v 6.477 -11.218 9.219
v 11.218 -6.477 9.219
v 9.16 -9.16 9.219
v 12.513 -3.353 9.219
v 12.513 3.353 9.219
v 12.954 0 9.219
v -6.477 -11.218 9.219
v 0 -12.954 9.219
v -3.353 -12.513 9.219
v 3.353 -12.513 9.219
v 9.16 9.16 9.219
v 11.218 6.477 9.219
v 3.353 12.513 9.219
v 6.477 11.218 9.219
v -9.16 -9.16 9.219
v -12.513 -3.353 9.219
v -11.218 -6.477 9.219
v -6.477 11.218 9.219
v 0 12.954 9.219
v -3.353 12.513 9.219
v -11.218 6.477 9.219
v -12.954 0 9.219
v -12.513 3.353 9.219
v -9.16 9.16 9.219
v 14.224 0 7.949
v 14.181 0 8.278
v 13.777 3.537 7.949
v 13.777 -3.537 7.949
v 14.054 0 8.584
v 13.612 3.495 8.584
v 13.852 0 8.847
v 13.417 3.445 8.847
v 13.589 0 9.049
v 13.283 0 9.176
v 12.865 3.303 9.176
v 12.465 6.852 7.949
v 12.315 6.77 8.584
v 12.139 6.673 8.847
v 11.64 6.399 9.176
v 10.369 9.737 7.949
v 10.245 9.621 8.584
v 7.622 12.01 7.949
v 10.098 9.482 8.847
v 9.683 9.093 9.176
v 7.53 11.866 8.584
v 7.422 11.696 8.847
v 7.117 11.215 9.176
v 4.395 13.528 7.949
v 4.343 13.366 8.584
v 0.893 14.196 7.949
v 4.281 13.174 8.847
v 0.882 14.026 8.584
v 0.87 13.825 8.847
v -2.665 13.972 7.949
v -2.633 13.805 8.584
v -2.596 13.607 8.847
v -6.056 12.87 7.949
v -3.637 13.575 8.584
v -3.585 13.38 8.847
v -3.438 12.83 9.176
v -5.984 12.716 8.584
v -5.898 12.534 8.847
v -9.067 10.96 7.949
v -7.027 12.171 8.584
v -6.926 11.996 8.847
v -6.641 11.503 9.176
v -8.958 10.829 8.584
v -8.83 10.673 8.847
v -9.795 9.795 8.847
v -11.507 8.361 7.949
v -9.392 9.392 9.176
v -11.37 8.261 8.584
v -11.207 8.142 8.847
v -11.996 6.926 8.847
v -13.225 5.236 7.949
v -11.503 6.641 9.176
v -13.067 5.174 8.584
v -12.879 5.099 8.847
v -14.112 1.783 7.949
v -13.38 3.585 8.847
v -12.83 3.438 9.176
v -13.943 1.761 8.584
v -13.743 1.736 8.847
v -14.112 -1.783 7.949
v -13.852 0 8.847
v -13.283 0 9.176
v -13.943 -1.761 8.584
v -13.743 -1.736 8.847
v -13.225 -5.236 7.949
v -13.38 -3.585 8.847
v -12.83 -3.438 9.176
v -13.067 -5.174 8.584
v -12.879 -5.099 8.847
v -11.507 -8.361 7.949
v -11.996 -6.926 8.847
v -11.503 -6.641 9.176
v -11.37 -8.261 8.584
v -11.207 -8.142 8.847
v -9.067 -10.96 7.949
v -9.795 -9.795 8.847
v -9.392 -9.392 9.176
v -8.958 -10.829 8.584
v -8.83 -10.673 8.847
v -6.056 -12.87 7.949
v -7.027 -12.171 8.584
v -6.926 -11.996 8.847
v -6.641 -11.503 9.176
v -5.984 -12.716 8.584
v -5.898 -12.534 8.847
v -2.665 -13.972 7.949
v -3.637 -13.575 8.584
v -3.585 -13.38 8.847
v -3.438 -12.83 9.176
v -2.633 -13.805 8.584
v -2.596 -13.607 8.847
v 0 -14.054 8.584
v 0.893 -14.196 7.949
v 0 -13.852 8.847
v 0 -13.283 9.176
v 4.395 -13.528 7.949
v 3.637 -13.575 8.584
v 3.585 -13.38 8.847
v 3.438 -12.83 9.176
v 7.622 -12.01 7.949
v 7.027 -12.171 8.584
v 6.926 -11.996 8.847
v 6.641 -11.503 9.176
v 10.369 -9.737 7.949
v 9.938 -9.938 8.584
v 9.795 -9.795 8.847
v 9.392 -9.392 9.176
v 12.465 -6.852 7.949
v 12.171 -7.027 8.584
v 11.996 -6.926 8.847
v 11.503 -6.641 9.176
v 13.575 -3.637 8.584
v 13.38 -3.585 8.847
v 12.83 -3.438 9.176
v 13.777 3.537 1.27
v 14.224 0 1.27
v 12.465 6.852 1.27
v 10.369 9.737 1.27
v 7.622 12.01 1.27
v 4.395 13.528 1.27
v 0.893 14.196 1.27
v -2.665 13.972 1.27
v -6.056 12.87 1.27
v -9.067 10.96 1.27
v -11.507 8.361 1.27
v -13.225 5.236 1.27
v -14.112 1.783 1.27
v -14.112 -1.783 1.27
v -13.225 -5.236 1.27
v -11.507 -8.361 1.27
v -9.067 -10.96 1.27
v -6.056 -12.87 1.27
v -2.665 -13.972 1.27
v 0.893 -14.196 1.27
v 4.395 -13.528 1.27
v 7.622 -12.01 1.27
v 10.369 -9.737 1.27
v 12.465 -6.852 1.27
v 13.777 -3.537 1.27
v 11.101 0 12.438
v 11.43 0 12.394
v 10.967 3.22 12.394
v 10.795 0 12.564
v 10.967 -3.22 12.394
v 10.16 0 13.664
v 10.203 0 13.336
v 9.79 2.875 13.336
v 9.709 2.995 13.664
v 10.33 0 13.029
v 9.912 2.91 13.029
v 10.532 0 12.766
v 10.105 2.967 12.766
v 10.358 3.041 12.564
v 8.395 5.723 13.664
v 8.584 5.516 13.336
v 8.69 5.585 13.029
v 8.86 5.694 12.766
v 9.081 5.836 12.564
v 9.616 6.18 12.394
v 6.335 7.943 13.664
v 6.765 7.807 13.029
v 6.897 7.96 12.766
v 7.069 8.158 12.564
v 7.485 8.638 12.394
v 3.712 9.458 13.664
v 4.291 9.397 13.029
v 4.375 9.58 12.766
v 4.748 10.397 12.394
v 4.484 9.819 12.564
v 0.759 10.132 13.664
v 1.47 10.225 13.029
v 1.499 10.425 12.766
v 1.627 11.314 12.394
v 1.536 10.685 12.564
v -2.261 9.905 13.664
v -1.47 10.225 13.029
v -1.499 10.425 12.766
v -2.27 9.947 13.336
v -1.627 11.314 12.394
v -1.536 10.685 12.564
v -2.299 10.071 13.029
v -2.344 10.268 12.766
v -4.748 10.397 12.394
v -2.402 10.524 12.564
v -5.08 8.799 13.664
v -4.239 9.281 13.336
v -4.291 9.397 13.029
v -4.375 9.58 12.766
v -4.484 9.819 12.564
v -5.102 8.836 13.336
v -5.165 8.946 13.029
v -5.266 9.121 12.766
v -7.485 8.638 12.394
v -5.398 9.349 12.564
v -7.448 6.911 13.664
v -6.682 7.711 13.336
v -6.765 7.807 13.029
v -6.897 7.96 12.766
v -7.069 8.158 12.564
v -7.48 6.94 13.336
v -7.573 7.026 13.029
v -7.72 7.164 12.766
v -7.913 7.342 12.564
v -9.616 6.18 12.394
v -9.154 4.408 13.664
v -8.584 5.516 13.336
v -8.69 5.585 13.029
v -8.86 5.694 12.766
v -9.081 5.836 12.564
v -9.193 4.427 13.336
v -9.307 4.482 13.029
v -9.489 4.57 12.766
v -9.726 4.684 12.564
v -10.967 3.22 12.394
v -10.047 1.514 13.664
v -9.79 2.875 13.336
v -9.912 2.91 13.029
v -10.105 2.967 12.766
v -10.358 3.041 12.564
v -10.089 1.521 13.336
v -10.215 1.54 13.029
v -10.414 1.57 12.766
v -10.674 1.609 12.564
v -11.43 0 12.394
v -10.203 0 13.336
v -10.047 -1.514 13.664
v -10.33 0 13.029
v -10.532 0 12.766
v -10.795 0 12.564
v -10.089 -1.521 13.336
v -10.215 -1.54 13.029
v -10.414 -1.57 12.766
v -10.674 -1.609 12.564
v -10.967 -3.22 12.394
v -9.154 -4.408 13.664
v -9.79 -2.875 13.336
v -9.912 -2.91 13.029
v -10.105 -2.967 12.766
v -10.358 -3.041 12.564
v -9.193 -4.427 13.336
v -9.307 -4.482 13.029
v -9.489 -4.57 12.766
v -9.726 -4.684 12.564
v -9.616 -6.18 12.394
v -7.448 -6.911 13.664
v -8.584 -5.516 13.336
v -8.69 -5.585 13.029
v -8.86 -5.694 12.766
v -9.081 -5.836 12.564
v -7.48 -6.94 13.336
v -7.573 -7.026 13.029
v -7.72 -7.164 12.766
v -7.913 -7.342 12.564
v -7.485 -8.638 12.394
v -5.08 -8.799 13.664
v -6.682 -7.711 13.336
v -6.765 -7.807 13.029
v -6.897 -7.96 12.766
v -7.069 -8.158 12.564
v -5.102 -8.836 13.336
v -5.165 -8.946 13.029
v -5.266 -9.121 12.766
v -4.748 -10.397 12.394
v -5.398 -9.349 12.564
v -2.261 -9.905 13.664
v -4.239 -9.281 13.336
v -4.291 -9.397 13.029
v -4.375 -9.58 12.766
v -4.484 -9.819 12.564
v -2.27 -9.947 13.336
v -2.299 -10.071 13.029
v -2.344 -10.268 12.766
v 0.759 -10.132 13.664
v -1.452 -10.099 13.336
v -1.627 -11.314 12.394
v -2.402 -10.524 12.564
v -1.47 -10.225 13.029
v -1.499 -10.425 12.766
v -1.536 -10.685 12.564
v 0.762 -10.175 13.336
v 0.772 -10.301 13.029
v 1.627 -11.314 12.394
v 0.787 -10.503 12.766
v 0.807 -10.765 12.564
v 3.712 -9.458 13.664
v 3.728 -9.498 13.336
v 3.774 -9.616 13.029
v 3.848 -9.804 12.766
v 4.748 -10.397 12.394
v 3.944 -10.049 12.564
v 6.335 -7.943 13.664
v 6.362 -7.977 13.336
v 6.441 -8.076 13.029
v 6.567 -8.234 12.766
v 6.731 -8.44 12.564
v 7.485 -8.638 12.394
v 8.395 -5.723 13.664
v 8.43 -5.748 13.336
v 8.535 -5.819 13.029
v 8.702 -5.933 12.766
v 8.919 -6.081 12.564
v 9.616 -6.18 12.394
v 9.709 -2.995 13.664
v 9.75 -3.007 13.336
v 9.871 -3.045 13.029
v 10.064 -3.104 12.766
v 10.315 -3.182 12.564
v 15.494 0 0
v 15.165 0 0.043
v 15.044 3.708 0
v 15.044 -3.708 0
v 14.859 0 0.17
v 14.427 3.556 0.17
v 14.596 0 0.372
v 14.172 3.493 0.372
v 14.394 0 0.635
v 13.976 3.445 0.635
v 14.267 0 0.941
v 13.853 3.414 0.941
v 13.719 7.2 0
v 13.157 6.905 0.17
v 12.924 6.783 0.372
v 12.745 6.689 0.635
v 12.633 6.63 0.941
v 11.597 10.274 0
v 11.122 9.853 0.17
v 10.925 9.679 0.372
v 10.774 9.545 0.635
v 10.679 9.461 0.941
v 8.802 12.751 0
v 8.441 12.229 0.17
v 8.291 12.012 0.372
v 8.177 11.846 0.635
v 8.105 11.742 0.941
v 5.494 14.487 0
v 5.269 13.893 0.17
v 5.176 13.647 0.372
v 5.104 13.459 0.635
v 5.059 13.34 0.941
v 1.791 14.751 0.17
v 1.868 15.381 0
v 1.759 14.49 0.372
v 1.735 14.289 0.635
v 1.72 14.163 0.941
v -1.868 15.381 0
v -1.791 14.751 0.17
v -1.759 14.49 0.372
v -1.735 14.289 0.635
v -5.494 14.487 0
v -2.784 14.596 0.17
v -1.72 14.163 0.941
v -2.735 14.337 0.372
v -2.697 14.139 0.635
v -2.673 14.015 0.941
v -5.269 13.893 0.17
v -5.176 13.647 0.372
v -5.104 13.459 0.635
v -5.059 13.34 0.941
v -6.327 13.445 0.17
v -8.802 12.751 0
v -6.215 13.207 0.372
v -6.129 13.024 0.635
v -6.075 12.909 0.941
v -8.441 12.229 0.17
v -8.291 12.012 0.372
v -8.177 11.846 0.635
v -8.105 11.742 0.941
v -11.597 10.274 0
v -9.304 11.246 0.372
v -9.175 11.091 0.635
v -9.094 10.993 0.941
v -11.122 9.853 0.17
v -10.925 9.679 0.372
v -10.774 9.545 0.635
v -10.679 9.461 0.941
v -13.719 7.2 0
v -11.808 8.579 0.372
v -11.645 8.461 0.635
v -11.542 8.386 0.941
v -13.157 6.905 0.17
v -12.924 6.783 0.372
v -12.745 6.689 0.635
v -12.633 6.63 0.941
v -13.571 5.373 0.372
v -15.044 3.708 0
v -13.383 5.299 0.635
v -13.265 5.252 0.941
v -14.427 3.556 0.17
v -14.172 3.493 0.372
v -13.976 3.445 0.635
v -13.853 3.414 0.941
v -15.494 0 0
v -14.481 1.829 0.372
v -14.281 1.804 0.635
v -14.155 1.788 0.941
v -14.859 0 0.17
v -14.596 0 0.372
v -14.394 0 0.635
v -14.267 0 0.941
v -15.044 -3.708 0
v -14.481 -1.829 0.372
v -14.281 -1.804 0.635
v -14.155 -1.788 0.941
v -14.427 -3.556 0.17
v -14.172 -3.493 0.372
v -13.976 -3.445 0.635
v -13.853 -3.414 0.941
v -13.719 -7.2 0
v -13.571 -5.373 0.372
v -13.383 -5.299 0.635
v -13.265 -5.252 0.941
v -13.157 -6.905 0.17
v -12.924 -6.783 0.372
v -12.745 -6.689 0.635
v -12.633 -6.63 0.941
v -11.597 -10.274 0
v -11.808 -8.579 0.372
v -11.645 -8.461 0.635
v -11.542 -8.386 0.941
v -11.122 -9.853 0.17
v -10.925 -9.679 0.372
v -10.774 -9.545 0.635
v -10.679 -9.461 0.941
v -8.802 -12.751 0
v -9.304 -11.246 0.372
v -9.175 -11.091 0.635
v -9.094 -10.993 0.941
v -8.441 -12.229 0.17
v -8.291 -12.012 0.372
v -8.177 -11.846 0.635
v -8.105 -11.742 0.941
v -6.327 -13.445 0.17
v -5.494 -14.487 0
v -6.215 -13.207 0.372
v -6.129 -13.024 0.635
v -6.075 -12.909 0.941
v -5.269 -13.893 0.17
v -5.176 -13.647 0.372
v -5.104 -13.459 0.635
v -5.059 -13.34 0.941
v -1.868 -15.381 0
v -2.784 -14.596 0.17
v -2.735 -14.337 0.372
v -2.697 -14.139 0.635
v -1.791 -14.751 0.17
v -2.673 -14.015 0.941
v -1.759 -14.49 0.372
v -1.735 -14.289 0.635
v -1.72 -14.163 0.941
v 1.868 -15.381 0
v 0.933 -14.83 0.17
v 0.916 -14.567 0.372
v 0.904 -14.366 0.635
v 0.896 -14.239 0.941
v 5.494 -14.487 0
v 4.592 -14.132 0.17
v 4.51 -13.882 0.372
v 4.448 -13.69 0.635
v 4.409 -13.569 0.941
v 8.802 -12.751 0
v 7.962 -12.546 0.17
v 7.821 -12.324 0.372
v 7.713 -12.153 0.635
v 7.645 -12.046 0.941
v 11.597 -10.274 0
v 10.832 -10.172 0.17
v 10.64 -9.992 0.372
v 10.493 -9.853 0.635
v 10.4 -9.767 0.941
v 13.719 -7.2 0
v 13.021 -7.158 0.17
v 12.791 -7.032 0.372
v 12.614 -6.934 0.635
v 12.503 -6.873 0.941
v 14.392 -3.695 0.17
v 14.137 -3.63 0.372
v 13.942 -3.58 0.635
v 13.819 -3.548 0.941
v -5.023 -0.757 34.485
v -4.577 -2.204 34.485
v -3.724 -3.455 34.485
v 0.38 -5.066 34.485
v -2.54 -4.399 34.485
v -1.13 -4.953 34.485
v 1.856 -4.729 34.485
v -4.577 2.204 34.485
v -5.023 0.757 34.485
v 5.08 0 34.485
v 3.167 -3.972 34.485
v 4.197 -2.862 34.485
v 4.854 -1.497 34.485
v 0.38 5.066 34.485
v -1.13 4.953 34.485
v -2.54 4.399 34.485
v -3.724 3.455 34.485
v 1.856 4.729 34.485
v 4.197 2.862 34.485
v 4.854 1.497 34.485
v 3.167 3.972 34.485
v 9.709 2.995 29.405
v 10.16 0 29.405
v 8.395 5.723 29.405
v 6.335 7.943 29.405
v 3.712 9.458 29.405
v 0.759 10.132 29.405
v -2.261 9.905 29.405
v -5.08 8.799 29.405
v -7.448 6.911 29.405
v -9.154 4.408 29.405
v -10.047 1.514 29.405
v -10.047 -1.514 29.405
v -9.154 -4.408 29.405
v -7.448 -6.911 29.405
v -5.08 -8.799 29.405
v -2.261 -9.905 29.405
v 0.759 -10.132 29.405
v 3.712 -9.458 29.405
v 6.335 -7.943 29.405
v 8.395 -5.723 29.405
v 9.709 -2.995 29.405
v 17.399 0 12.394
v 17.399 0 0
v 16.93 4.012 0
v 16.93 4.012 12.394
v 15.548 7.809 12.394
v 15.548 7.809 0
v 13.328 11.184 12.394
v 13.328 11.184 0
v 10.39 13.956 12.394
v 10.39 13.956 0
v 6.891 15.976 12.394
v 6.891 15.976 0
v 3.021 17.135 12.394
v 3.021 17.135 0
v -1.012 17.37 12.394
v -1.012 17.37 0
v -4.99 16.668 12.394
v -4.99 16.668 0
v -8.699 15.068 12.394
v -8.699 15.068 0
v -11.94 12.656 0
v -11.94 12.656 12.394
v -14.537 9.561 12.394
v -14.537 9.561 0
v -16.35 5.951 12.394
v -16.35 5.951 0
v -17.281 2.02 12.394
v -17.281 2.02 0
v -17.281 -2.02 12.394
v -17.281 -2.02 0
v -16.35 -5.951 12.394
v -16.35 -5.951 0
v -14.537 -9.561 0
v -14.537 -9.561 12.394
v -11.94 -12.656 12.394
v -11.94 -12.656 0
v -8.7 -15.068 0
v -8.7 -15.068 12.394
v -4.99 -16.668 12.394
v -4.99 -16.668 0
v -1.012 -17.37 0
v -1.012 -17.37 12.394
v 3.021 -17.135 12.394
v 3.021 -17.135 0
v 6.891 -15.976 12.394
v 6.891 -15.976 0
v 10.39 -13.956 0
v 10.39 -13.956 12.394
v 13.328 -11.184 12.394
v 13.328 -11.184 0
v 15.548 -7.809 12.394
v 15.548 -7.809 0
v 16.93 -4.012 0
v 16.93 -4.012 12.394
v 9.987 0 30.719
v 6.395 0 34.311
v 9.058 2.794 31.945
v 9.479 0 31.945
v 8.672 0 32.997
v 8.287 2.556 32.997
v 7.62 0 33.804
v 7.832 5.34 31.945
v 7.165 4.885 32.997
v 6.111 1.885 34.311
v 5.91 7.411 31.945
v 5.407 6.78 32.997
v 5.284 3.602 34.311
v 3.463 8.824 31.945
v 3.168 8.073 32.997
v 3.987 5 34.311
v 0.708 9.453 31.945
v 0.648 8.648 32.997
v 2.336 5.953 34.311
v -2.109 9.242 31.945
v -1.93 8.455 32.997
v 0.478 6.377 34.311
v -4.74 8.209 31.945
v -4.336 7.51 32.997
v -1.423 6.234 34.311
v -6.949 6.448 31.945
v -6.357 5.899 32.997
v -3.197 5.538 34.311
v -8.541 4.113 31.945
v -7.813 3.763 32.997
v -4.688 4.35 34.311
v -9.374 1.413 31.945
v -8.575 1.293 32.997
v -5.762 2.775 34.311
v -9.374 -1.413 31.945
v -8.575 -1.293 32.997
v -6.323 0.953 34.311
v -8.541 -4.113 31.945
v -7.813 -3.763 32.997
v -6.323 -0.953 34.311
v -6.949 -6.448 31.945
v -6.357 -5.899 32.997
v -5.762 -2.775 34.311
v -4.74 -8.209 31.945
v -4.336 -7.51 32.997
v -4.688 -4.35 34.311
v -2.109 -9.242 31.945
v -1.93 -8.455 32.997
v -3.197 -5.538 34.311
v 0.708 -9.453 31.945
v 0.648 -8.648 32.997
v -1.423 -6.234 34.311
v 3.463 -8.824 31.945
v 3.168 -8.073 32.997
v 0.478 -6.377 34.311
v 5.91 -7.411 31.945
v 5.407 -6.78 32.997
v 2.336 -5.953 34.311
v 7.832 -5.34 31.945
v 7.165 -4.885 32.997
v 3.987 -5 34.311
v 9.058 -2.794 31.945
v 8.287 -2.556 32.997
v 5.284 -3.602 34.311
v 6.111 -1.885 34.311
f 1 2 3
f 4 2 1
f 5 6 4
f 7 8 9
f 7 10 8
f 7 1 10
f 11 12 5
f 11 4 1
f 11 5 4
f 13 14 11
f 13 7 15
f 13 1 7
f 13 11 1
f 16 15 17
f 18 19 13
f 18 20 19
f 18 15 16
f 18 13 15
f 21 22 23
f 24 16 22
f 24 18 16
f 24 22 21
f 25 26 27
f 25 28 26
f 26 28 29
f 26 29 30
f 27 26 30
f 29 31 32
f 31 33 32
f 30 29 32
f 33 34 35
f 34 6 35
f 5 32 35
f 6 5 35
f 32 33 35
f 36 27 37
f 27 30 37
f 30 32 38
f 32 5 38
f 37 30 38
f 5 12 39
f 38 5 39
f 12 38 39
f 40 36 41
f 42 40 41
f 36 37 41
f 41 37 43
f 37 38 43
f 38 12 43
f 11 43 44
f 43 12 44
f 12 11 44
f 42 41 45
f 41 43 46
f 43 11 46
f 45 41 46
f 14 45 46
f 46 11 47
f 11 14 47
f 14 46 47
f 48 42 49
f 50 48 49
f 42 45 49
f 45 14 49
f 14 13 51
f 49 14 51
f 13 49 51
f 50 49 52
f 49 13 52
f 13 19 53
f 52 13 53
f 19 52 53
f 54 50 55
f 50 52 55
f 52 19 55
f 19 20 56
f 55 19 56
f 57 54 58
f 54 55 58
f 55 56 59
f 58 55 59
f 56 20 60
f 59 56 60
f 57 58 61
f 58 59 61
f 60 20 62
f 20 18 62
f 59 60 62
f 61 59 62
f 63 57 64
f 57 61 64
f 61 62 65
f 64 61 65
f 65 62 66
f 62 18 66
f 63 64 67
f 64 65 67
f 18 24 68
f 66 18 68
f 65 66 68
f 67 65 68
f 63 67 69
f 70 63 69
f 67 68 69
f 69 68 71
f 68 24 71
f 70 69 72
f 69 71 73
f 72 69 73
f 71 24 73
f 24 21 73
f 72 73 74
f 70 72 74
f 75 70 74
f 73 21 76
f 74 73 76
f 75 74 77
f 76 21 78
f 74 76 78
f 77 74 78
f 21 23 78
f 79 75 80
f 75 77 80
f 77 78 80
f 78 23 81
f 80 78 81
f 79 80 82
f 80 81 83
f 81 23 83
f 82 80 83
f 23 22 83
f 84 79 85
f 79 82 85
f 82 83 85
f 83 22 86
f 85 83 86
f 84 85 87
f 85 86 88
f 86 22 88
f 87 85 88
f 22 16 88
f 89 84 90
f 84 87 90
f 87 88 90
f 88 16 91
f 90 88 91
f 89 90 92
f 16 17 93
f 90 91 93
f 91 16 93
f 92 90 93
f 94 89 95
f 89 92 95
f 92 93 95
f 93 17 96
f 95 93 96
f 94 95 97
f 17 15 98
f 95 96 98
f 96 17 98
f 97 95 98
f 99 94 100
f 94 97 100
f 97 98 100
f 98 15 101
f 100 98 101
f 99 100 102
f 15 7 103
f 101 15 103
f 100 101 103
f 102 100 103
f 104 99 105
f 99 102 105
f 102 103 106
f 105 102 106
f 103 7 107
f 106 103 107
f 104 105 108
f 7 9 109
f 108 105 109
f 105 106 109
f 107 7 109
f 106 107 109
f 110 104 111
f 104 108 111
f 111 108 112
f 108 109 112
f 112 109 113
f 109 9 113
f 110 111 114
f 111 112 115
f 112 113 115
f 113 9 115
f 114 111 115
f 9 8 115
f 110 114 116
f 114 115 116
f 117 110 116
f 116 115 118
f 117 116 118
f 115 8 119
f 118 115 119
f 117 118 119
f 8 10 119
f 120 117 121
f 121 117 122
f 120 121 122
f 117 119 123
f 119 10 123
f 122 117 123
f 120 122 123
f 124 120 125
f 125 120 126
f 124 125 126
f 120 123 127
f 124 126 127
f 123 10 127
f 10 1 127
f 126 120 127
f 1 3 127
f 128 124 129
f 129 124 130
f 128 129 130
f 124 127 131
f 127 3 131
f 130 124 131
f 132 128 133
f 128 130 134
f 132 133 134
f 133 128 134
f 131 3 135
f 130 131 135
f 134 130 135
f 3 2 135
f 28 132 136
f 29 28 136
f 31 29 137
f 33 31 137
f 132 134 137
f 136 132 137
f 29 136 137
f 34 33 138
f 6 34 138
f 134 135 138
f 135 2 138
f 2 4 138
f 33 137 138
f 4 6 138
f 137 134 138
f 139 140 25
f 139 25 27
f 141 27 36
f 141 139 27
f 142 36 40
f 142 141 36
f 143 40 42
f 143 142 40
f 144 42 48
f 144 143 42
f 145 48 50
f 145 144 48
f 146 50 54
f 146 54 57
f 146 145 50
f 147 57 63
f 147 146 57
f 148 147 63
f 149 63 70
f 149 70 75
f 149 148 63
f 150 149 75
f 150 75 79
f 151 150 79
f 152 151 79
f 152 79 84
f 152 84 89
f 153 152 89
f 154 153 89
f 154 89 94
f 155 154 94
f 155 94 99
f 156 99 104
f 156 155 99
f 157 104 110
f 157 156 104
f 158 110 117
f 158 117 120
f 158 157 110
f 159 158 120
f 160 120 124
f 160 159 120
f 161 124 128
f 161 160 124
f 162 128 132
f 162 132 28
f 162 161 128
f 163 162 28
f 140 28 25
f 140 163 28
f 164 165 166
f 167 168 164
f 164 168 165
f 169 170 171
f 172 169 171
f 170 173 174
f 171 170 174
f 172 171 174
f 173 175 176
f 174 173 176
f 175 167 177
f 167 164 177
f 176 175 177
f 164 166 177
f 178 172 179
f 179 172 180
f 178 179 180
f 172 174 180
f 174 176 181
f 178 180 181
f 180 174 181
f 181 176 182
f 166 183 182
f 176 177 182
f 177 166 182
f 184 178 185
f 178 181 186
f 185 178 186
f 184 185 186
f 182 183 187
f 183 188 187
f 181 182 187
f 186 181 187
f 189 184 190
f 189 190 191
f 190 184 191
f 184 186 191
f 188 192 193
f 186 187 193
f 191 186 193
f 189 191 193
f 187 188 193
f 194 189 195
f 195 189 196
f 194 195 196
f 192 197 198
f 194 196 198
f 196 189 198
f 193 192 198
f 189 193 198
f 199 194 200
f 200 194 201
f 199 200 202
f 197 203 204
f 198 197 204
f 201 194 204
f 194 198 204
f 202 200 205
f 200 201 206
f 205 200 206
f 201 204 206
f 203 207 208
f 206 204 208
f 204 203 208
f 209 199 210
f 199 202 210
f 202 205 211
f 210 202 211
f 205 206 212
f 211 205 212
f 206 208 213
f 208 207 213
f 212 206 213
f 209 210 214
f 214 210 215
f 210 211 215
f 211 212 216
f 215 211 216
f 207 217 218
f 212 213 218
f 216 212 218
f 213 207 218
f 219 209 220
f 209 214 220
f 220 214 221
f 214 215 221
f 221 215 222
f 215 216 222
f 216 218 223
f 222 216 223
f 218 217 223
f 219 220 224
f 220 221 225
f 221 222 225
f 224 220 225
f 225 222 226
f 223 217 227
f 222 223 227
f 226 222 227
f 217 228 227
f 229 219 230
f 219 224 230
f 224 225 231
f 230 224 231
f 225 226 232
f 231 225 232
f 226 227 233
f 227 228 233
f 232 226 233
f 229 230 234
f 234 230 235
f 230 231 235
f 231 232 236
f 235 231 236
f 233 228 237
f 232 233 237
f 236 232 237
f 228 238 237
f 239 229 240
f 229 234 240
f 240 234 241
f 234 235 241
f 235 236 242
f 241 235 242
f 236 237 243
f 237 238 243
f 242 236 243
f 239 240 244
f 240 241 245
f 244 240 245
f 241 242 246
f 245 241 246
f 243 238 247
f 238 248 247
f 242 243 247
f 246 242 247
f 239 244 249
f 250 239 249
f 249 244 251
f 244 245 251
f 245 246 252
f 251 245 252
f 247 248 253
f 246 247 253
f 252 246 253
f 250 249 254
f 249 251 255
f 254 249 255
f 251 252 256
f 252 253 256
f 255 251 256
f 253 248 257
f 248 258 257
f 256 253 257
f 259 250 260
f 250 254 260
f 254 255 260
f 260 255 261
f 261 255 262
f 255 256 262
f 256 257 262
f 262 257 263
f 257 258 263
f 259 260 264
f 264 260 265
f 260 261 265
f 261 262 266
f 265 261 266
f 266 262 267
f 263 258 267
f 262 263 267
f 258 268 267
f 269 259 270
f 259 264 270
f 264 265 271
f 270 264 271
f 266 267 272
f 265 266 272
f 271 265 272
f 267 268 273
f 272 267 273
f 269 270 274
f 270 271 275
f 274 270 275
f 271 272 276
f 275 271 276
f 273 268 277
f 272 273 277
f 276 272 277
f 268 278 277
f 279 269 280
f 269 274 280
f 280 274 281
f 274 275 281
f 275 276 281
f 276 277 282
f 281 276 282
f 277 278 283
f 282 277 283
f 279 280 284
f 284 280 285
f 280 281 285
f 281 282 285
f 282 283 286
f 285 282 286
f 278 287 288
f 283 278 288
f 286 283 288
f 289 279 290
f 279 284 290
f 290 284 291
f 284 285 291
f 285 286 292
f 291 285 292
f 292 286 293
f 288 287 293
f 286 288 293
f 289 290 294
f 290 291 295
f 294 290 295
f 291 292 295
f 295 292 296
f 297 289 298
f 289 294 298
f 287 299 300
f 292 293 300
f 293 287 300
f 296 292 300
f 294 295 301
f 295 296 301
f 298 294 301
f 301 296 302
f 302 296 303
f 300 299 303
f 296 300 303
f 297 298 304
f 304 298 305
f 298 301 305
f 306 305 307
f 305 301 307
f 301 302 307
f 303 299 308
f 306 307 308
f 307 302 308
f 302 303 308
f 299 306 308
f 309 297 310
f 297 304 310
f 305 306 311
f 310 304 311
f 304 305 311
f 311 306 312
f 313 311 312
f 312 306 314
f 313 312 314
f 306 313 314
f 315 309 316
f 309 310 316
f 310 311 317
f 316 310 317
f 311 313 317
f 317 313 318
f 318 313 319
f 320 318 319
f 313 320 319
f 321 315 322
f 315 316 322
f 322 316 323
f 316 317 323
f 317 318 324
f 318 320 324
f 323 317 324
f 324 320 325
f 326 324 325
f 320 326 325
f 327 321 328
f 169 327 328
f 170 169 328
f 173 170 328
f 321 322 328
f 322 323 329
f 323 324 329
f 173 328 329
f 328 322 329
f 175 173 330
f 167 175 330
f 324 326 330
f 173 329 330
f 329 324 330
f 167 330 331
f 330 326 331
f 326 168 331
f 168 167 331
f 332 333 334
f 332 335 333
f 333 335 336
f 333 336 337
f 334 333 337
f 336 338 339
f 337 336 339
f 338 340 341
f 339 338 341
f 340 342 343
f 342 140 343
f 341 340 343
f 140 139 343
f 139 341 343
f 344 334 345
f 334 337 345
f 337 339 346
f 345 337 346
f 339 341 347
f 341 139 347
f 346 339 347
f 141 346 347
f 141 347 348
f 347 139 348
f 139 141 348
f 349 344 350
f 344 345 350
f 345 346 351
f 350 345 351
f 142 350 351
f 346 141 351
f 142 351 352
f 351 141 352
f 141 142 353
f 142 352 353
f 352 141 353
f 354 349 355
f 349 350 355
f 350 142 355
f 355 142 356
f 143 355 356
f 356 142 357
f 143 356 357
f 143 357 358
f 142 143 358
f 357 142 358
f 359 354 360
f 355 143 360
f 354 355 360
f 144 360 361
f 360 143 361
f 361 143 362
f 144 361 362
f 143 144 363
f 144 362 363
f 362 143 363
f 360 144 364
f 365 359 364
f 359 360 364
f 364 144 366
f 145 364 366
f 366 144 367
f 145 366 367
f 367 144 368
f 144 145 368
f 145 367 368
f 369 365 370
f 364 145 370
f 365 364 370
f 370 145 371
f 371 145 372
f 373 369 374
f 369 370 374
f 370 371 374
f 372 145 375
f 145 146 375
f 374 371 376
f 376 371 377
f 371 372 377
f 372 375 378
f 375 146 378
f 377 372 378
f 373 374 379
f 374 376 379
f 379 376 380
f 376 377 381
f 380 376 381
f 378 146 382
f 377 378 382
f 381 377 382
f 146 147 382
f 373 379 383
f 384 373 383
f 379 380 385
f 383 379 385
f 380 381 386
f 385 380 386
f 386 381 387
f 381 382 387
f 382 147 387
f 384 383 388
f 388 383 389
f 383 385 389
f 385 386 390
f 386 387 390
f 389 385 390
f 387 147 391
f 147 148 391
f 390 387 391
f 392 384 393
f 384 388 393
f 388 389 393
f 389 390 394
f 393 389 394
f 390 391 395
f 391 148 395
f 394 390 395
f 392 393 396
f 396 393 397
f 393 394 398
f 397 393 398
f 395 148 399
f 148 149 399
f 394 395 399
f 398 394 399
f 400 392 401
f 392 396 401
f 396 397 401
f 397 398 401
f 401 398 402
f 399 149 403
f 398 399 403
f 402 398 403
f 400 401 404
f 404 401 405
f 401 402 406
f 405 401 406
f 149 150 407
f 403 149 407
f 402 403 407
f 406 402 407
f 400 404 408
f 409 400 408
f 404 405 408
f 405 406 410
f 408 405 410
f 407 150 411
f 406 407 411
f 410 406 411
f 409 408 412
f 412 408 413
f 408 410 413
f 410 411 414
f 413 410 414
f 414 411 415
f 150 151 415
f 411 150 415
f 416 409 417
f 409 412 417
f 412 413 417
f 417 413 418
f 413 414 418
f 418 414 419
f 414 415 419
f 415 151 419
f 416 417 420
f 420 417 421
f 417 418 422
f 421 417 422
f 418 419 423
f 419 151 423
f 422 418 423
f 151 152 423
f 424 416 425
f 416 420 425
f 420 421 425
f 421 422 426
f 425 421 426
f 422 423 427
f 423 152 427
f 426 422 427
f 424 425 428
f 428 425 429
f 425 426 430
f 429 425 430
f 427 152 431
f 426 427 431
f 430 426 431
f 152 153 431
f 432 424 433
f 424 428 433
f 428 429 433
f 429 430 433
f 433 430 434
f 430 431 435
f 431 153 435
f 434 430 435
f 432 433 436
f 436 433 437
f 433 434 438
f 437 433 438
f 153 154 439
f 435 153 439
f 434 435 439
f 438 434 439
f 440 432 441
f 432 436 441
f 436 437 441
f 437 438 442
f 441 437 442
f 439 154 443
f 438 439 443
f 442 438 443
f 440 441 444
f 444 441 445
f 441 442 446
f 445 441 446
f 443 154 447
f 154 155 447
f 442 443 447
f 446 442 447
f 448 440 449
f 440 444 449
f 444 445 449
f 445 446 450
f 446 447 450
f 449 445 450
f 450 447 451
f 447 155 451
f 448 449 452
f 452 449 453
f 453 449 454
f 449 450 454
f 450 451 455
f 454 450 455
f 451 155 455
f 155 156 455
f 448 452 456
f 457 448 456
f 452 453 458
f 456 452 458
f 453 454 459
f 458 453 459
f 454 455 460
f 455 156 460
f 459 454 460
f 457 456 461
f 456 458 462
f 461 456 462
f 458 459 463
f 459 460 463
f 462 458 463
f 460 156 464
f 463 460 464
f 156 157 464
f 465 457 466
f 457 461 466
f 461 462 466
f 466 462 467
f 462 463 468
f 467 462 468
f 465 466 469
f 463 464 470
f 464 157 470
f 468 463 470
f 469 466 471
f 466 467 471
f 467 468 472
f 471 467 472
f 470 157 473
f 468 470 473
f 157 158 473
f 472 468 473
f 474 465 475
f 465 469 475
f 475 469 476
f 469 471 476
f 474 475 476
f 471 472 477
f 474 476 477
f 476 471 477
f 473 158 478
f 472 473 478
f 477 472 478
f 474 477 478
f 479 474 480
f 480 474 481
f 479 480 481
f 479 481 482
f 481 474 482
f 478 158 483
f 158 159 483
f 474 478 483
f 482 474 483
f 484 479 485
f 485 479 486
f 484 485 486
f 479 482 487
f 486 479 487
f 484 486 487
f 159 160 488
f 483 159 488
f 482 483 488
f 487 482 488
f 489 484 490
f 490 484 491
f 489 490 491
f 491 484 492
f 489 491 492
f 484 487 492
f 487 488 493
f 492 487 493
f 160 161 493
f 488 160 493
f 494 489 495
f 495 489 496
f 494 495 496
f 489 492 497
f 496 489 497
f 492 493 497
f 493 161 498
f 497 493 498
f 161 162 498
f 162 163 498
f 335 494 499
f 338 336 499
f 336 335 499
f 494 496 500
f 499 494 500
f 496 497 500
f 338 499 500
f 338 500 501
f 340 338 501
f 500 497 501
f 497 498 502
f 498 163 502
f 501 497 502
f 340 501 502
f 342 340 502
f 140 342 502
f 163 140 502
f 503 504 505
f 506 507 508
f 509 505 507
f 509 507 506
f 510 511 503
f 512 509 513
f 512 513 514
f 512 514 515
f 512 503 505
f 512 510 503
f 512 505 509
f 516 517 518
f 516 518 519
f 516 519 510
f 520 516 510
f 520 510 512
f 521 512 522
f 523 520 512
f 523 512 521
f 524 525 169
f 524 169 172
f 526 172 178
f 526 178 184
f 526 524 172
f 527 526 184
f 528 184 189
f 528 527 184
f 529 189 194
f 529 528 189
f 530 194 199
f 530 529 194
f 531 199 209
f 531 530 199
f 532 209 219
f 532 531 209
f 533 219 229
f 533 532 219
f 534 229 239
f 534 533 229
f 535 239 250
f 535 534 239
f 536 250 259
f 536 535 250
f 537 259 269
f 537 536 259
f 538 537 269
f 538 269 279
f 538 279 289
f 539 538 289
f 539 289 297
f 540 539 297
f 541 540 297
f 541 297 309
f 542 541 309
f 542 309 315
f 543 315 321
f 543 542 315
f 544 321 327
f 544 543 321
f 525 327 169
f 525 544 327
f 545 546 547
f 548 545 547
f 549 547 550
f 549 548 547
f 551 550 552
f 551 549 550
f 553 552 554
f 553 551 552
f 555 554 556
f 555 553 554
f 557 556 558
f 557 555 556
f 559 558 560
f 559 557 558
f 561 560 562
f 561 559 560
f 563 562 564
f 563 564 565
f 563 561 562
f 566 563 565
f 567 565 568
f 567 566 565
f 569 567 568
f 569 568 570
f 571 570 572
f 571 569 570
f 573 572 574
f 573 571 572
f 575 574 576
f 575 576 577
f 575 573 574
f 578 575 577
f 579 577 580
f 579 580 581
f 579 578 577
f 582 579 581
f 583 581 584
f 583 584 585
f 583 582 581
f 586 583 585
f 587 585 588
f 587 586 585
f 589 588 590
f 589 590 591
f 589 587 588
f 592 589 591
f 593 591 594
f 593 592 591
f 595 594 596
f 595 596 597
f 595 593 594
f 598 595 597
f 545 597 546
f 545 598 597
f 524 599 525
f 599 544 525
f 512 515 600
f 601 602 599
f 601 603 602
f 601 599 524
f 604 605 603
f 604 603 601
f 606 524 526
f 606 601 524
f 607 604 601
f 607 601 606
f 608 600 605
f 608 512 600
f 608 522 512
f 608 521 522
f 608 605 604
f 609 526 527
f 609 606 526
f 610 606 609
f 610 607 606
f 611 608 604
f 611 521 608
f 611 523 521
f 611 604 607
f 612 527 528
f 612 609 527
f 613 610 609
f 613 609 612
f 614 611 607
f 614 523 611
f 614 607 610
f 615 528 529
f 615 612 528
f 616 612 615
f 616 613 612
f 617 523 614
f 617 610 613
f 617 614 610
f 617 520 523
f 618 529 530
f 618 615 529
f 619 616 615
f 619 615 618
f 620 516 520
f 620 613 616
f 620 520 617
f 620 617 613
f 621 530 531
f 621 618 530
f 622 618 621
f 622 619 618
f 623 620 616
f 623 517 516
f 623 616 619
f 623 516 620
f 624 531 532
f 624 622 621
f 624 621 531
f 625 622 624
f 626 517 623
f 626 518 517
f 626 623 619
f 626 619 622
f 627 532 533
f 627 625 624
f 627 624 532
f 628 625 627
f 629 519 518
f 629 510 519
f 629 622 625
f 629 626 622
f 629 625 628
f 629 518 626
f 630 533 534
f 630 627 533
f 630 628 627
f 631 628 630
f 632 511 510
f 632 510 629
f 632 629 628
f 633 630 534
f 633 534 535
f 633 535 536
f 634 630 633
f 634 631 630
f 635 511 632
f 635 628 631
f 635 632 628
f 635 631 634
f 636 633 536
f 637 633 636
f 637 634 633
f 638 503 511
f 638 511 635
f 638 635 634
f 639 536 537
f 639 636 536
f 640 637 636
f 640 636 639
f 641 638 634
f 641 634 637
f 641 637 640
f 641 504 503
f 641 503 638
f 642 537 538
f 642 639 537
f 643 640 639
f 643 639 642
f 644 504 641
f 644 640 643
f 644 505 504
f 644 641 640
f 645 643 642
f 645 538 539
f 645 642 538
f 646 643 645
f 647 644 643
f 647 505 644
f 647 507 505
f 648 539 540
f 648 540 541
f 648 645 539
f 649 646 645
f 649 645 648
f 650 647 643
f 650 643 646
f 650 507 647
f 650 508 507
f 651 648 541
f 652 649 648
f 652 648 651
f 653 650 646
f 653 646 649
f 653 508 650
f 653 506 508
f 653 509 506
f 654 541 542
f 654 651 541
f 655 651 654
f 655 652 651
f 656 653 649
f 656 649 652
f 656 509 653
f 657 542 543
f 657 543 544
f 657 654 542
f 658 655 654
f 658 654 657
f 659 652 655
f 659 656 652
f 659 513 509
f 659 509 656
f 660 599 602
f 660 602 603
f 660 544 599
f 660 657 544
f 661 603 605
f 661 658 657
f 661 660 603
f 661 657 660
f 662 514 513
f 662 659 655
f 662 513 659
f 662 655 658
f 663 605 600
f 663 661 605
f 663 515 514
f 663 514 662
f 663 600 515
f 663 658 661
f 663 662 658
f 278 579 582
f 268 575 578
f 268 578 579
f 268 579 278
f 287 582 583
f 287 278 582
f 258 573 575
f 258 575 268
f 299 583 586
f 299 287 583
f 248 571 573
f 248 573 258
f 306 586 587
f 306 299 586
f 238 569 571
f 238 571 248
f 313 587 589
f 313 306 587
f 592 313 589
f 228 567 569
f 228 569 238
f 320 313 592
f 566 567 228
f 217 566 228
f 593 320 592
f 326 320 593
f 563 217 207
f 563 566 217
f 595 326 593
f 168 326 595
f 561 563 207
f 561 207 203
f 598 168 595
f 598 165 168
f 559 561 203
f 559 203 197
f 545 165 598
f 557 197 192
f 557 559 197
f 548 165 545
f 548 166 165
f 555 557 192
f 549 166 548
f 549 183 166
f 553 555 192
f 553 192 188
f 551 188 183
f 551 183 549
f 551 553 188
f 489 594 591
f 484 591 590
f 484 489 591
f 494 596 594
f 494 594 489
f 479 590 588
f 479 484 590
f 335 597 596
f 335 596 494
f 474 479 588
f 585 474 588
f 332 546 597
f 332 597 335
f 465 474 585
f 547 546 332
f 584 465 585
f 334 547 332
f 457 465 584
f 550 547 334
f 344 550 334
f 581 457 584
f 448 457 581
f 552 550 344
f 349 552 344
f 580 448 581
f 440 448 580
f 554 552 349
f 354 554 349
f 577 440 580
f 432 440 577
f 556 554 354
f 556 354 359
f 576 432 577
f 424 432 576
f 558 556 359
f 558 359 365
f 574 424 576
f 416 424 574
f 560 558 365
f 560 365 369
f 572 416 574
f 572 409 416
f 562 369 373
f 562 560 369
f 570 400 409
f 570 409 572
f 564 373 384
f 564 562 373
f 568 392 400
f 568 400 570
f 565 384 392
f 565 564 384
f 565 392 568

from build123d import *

# Parameters (mm, degrees)
F2_R = 5.08
F3_R = 1.27
F4_R = 1.27


with BuildPart() as f1:
    # F0 (on Front) → F1 (revolve)
    with BuildSketch(Plane.XZ):
        Polygon((14.224, 0), (17.399, 0), (17.399, 12.394325), (10.16, 12.394325), (10.16, 34.484531), (0, 34.484531), (0, 9.219325), (14.224, 9.219325), align=None)
    revolve(axis=Axis((0, 0, 21.851928), (0, 0, 1)))

    # F2
    f2_edges = [f1.edges().sort_by_distance(p)[0] for p in [
        (-10.16, 0, 34.484531),
    ]]
    fillet(f2_edges, radius=F2_R)

    # F3
    f3_edges = [f1.edges().sort_by_distance(p)[0] for p in [
        (-10.16, 0, 12.394325),
    ]]
    fillet(f3_edges, radius=F3_R)

    # F4
    f4_edges = [f1.edges().sort_by_distance(p)[0] for p in [
        (-14.224, 0, 9.219325),
        (-14.224, 0, 0),
    ]]
    fillet(f4_edges, radius=F4_R)


solid = f1.part
